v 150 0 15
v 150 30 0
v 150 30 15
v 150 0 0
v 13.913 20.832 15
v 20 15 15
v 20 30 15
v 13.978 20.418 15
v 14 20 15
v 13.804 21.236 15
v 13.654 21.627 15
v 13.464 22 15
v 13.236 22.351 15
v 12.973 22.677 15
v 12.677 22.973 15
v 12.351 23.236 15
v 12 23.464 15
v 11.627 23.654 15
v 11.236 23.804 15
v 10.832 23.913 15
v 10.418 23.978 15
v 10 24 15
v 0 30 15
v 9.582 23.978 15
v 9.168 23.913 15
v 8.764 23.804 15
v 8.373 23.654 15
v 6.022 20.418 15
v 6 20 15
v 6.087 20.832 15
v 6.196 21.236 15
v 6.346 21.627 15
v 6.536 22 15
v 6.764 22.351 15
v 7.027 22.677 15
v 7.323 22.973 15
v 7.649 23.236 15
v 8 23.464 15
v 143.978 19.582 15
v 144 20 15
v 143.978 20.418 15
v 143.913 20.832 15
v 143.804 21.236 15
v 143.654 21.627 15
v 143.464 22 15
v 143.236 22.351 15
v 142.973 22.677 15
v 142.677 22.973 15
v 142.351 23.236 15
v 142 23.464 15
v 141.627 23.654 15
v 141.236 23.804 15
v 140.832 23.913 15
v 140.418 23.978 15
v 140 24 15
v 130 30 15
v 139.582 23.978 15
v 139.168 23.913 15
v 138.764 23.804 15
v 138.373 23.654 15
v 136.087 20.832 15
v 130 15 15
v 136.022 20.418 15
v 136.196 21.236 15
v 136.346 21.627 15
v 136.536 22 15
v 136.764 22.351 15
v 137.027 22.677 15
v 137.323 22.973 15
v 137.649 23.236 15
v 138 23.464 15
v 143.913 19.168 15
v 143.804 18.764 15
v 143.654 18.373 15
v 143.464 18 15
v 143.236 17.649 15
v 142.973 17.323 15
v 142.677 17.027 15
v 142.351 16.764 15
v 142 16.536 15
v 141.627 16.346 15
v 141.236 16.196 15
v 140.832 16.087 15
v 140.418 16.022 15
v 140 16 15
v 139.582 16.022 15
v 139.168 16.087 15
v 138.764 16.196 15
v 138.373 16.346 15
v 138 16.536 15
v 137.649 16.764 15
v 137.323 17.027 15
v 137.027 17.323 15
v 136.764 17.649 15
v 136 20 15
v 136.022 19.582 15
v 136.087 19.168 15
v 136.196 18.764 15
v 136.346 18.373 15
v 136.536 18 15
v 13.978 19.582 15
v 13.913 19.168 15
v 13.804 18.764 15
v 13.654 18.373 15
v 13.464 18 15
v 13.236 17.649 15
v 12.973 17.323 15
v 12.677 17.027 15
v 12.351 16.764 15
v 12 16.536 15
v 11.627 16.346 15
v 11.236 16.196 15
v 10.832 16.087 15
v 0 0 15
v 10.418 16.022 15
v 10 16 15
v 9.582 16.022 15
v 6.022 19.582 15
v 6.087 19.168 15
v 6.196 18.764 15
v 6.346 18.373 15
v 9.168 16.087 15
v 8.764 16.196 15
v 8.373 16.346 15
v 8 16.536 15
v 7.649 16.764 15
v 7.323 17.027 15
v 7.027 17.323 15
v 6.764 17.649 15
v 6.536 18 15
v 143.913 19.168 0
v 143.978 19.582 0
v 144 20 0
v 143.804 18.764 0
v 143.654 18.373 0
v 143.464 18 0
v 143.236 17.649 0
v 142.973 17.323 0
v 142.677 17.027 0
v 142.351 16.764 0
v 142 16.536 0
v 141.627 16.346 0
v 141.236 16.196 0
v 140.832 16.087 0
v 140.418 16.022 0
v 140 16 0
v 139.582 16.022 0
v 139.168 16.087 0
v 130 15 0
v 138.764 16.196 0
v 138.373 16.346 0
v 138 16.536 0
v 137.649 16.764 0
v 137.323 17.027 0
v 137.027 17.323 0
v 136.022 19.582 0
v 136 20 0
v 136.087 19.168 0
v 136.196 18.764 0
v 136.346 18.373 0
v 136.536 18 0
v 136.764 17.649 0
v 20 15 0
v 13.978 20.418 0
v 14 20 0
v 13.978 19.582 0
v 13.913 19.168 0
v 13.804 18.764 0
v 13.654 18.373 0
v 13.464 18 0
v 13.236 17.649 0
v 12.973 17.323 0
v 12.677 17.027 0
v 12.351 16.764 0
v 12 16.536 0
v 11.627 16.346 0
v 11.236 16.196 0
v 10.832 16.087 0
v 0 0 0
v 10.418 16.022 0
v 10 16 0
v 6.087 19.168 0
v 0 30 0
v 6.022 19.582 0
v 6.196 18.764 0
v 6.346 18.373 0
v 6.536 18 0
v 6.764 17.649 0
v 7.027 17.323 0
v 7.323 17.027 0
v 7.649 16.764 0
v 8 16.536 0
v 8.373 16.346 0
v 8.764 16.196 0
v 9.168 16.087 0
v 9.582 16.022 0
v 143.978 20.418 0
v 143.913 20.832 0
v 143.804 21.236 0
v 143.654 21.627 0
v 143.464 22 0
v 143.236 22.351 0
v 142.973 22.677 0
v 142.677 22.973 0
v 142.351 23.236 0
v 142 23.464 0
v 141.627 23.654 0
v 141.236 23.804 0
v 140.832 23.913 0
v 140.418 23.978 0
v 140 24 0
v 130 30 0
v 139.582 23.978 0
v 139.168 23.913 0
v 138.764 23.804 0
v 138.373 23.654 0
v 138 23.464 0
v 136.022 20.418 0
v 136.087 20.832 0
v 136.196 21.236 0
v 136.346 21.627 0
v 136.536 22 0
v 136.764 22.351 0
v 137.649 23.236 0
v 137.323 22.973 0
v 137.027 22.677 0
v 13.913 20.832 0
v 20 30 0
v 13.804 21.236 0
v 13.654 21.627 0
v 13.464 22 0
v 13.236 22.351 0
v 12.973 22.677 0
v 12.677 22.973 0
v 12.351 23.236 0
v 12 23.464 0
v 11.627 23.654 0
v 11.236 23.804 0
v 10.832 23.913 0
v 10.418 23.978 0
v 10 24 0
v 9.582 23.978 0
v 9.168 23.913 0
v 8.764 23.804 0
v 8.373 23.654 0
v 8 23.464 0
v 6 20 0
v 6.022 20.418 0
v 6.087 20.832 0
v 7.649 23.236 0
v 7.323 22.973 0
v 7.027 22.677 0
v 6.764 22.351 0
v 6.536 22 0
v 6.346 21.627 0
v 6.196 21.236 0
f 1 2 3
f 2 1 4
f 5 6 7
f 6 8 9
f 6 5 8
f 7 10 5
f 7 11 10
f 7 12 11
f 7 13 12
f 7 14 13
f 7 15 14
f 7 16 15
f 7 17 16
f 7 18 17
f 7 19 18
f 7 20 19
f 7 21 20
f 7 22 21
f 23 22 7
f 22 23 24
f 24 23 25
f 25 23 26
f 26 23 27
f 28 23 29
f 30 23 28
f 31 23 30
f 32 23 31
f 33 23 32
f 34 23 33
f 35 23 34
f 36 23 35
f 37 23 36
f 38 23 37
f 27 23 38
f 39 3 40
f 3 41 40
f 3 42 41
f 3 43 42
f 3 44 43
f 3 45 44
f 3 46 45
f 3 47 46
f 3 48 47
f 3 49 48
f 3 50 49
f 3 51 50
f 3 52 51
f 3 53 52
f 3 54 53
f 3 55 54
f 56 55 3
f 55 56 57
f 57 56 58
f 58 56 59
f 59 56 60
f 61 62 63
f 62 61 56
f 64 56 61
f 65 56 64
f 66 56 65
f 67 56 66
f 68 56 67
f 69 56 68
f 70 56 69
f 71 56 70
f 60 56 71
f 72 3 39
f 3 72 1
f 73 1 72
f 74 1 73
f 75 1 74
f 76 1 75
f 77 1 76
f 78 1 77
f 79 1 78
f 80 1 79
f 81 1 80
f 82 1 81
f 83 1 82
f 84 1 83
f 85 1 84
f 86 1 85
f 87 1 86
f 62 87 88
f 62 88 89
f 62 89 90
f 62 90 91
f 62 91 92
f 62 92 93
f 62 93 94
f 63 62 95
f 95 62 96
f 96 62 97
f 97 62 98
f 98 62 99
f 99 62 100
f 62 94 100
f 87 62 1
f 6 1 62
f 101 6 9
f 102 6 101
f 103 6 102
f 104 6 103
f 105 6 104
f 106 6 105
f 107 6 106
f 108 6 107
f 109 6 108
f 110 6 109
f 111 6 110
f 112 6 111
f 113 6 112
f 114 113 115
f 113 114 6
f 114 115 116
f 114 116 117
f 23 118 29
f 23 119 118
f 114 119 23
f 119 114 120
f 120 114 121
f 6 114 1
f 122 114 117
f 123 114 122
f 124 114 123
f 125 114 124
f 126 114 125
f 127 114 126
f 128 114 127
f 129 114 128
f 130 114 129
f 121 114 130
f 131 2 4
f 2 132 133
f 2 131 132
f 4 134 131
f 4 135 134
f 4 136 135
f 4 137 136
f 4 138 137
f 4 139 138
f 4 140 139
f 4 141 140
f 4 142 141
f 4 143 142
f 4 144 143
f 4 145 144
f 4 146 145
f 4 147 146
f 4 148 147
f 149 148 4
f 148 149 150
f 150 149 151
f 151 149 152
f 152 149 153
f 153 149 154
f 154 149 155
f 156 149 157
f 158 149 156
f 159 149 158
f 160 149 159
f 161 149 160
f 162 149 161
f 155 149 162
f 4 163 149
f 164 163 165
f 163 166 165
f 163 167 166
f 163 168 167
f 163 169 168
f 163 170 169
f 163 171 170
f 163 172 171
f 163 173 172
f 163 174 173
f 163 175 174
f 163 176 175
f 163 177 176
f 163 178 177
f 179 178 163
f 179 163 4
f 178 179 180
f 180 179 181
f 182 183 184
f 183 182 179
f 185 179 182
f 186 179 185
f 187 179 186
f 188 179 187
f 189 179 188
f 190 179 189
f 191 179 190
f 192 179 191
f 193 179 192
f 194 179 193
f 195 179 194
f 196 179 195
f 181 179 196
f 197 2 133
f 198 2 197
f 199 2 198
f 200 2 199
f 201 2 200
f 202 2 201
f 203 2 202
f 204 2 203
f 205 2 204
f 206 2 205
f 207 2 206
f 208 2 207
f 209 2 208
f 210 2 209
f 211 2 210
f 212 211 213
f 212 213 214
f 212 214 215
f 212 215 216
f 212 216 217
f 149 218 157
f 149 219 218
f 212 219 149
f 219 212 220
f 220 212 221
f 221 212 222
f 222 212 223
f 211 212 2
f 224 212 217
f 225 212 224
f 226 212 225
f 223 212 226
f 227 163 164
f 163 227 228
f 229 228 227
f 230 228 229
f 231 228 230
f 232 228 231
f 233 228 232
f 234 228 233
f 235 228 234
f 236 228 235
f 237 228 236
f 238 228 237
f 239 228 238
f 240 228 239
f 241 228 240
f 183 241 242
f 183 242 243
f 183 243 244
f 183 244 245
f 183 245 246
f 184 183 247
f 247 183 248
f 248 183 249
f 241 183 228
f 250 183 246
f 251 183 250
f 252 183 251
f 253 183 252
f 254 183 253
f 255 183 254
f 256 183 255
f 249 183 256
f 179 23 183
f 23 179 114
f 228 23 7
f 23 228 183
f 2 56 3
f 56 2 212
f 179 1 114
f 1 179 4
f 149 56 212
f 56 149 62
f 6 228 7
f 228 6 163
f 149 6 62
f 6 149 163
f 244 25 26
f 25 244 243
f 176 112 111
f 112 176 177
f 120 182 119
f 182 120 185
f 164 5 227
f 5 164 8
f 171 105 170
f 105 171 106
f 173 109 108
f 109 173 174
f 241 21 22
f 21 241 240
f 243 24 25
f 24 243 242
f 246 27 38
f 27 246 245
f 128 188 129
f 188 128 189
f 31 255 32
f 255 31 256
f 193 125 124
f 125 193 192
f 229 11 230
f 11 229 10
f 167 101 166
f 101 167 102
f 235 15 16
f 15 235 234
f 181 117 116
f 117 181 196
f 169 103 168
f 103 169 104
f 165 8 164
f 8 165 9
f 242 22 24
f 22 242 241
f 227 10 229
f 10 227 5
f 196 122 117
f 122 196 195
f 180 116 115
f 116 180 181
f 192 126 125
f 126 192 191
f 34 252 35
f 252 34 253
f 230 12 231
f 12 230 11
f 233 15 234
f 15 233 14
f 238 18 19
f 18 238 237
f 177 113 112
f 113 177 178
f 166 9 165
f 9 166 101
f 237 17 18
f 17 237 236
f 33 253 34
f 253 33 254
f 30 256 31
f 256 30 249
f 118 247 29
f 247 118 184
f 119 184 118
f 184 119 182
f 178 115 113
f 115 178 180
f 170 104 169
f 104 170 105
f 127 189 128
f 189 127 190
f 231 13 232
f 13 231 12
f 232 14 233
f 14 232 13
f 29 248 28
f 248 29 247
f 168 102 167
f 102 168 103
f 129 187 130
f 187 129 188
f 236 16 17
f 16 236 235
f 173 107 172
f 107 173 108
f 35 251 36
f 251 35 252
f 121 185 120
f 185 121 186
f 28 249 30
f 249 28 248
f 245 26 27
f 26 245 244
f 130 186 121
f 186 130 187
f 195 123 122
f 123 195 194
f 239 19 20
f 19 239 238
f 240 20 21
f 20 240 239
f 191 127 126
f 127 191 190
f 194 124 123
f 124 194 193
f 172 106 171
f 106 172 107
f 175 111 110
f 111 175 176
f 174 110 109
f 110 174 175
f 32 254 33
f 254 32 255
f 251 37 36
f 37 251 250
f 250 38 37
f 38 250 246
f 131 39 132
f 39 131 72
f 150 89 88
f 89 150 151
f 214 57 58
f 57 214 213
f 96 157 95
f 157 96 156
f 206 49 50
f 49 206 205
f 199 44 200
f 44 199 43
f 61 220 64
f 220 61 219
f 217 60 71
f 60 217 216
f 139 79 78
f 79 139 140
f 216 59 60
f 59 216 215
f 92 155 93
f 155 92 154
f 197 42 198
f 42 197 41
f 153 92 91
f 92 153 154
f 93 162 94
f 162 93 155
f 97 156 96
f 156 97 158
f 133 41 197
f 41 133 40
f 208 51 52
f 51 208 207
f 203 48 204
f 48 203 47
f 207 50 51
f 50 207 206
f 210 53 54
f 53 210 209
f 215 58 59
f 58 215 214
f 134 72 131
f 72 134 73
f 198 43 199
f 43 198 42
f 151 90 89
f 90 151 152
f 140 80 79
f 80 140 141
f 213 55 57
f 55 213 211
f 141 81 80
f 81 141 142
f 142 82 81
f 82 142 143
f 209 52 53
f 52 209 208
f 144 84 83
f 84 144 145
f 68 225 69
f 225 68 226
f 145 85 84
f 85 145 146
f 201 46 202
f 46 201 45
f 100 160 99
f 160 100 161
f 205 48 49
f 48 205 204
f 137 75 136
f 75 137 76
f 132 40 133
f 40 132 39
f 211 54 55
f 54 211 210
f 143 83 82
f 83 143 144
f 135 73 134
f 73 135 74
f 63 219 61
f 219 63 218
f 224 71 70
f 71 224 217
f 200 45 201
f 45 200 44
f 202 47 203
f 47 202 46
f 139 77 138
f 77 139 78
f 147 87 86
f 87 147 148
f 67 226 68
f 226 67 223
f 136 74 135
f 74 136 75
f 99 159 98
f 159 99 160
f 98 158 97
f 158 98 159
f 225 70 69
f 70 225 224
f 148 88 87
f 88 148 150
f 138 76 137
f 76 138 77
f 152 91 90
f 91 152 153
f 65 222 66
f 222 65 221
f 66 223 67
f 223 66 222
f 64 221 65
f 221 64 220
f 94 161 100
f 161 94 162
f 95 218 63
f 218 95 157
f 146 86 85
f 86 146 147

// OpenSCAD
$fn=60;
difference(){
cube([150,30,15]);
translate([20,15,-2])cube([110,30,20]);
translate([10,20,-2])cylinder(d=8,h=20);
translate([140,20,-2])cylinder(d=8,h=20);
}
